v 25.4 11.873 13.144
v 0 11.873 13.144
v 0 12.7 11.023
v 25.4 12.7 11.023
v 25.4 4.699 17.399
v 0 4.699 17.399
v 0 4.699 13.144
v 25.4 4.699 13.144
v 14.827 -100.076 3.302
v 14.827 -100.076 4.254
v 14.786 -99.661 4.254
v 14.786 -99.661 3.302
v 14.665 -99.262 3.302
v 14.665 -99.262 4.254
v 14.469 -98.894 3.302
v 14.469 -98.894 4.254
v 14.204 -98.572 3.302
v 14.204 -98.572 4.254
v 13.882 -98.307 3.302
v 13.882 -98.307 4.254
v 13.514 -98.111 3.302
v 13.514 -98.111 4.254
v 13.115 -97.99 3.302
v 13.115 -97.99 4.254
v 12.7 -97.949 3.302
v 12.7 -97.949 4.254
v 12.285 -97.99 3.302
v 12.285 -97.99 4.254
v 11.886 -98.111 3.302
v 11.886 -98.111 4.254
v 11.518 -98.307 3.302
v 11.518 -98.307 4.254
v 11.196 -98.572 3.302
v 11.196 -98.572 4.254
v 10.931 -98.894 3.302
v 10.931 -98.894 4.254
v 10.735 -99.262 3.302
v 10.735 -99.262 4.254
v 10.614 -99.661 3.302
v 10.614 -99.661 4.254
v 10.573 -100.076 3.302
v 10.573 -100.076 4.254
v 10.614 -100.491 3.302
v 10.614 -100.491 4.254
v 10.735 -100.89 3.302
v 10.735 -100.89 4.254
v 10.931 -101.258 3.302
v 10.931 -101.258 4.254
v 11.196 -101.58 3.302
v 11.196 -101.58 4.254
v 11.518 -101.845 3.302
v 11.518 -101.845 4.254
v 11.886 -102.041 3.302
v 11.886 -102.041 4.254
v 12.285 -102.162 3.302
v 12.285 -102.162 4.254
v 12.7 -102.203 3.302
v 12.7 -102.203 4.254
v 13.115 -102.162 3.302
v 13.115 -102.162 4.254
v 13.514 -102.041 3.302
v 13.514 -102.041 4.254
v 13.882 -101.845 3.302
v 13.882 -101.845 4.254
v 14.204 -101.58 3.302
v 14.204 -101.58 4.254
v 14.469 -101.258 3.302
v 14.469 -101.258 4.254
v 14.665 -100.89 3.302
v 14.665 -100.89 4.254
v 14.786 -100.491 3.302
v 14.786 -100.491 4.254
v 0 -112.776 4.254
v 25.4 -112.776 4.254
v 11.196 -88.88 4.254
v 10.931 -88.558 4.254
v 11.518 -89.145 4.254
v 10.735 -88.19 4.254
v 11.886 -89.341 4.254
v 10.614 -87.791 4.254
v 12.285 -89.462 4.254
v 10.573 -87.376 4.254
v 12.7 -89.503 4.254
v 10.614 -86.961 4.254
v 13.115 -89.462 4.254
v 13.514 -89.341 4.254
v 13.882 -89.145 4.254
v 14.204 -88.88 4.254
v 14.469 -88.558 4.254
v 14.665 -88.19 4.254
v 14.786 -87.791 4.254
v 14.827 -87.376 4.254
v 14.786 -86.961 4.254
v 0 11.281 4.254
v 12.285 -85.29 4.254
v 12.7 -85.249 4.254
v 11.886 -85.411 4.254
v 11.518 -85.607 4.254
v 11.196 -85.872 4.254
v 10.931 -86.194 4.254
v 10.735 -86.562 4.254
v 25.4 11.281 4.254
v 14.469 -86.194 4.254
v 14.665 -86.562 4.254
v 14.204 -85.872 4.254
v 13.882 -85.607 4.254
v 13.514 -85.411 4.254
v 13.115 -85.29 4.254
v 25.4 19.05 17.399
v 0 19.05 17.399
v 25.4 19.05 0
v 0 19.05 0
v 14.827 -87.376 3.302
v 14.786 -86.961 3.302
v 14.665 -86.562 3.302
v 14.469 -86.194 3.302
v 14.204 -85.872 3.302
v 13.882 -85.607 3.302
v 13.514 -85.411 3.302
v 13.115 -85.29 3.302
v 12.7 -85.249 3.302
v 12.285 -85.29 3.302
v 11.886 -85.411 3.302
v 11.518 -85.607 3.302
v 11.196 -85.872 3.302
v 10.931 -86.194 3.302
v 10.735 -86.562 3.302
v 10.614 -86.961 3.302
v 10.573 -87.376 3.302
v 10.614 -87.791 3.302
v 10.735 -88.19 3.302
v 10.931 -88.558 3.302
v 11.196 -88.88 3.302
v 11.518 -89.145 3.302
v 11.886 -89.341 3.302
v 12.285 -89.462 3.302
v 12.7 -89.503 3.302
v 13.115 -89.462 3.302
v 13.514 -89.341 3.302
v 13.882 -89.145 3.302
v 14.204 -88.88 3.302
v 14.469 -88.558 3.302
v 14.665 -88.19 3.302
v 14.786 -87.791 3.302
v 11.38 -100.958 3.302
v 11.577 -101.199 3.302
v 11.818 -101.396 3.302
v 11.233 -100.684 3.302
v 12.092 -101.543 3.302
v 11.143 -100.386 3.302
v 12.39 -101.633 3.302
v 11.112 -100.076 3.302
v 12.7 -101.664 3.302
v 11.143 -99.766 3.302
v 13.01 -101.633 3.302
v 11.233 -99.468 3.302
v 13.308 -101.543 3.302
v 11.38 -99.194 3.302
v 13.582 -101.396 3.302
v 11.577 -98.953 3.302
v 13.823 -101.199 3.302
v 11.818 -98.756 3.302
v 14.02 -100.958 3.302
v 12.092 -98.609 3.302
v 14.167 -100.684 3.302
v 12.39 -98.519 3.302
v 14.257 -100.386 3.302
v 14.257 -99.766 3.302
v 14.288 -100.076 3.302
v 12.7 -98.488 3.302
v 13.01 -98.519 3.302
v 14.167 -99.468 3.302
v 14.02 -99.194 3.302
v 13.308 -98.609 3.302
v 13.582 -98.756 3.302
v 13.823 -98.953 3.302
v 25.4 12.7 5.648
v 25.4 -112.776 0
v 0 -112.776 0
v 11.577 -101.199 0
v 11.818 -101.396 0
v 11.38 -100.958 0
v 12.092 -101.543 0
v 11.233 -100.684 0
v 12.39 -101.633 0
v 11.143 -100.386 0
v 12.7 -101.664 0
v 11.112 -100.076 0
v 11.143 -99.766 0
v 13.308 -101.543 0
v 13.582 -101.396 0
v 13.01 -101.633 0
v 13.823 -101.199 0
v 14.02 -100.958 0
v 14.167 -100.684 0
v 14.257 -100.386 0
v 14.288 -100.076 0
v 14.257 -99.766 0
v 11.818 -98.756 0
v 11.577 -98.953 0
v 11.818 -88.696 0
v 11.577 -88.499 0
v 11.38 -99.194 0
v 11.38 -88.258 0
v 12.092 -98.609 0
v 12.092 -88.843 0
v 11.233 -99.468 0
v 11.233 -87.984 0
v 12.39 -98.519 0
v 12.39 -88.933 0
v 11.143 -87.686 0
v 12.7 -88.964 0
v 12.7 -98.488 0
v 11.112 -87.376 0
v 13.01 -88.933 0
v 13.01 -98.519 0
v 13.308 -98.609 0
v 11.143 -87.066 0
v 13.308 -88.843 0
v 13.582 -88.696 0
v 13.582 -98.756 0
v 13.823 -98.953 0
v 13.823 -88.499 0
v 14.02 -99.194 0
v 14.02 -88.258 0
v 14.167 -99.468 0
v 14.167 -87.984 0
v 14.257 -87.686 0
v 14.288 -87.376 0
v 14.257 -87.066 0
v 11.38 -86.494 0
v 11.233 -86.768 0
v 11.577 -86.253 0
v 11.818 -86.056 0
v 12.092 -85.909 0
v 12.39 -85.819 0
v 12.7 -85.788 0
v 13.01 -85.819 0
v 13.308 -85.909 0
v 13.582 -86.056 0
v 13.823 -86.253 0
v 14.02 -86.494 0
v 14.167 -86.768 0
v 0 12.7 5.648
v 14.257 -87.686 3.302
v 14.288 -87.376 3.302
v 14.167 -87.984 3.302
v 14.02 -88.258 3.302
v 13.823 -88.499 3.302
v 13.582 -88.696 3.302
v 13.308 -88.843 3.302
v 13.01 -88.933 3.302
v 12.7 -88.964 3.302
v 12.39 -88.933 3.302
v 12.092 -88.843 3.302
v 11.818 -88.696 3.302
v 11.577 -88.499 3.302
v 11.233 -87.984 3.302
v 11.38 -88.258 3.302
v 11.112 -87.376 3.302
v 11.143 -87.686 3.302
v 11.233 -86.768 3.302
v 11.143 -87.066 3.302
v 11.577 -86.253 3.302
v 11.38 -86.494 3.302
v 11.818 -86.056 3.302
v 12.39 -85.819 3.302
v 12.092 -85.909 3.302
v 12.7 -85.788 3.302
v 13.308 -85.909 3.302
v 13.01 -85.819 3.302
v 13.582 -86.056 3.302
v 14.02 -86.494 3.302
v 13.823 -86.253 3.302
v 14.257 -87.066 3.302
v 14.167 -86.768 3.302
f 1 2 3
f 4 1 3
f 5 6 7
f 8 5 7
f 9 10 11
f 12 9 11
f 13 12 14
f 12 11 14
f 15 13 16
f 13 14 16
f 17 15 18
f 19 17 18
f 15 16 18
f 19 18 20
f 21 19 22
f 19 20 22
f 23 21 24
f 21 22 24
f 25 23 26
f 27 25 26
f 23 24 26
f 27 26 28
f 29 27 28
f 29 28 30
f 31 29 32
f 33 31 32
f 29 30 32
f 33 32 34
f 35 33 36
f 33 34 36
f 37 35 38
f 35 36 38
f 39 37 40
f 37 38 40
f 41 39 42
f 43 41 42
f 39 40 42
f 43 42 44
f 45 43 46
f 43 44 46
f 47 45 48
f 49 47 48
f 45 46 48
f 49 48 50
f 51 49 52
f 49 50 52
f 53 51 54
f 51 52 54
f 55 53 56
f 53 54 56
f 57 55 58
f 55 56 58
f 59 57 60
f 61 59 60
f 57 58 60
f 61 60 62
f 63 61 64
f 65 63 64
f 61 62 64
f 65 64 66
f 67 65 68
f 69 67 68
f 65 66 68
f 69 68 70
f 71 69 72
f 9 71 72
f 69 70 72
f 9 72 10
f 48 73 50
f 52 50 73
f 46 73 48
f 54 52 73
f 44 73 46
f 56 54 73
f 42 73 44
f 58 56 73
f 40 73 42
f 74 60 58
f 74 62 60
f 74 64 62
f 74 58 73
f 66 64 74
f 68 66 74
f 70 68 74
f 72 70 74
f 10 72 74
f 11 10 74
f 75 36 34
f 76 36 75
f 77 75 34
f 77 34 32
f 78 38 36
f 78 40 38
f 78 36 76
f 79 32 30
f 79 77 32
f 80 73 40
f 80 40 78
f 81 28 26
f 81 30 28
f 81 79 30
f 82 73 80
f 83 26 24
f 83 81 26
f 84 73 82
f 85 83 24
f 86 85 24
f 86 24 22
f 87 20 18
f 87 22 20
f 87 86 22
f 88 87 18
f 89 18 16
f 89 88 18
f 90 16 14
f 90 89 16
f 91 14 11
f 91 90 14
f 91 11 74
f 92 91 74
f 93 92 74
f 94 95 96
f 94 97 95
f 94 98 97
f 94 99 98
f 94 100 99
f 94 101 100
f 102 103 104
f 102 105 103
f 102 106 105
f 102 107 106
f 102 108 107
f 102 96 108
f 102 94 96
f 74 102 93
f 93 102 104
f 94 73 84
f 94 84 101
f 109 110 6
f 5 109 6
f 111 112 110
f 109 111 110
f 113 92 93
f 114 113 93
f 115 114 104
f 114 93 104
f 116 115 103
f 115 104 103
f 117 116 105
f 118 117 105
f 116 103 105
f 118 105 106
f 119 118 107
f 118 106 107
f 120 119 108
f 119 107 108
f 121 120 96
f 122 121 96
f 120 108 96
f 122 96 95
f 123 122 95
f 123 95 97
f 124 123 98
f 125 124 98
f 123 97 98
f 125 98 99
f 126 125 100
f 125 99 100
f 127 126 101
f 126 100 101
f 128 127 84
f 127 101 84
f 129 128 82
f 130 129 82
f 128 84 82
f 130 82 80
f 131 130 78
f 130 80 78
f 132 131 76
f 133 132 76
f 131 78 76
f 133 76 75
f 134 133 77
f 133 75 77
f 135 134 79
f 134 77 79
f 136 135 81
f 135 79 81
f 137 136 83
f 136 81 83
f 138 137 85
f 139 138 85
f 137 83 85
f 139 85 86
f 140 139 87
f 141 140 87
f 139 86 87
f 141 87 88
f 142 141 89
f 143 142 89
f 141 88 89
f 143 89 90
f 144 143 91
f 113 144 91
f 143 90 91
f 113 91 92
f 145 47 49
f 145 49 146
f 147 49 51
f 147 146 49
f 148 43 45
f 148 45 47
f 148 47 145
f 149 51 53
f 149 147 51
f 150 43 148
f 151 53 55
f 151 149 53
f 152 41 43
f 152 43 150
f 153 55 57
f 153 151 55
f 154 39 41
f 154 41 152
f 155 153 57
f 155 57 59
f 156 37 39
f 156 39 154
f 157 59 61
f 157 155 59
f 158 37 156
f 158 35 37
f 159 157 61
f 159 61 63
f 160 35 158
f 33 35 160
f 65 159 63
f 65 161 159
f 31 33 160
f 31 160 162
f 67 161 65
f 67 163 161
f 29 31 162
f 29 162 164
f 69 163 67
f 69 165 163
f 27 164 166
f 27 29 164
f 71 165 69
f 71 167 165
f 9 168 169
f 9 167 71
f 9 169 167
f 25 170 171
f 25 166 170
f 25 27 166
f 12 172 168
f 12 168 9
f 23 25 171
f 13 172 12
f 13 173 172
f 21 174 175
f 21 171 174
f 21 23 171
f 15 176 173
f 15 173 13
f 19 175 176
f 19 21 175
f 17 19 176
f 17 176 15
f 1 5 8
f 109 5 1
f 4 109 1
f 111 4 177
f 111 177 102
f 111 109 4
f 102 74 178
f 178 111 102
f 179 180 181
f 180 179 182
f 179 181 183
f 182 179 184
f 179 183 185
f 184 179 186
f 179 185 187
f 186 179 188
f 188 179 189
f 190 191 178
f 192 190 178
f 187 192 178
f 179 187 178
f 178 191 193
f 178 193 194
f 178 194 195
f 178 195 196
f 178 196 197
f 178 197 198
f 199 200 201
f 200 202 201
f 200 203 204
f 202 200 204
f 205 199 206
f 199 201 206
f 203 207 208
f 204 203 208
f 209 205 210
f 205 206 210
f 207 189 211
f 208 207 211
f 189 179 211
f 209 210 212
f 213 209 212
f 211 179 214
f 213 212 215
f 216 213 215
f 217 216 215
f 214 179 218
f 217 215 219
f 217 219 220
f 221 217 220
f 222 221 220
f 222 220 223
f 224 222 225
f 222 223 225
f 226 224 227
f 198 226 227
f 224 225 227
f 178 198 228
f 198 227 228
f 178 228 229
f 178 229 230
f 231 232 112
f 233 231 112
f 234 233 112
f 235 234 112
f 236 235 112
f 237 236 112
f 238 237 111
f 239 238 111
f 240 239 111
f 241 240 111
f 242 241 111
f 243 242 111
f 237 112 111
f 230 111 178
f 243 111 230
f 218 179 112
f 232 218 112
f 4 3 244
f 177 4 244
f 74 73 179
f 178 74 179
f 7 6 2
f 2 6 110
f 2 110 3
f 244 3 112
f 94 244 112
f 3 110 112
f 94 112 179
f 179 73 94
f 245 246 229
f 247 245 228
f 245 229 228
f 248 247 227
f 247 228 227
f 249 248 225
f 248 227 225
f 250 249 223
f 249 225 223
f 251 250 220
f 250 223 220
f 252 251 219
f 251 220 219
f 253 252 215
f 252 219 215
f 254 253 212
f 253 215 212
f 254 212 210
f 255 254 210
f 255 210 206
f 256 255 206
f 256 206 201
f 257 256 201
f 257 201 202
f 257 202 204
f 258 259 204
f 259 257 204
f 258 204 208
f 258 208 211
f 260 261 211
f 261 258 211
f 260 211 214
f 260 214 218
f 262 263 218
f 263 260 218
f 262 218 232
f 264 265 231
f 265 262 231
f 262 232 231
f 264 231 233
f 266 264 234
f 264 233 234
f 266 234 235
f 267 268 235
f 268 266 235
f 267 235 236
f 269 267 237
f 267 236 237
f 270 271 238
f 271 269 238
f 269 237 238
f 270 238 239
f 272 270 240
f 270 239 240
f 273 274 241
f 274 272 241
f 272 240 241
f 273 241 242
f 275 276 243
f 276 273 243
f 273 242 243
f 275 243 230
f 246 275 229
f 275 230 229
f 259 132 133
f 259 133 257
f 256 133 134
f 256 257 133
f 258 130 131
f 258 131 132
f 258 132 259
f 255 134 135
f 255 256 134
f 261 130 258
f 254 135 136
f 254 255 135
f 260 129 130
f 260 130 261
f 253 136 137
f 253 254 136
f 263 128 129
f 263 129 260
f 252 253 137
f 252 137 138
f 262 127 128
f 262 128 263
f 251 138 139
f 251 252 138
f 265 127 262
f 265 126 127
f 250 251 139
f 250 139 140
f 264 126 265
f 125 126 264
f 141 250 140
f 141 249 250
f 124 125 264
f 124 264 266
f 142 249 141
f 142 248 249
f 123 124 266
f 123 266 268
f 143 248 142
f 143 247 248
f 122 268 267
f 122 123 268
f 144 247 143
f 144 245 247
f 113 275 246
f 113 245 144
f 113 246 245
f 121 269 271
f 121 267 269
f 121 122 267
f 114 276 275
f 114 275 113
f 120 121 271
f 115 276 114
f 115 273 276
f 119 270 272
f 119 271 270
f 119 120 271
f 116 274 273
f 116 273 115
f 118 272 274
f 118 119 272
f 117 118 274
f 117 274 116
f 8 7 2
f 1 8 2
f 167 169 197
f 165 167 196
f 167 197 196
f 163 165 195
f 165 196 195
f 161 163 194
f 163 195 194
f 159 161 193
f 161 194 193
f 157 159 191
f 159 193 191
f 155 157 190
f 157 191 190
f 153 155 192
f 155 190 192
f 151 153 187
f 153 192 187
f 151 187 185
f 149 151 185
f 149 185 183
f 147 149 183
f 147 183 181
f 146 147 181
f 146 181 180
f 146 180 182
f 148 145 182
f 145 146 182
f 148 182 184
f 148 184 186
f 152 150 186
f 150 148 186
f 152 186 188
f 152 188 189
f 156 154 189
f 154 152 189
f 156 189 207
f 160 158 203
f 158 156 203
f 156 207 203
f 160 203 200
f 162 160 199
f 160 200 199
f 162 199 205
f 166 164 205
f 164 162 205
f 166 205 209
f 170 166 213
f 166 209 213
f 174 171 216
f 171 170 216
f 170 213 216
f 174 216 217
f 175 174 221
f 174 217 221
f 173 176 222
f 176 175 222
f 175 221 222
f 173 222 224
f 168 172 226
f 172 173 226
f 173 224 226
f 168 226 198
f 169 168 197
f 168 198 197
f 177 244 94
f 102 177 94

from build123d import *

# Parameters (mm, degrees)
F1_DEPTH = 25.4
F2_DEPTH = 112.776
F3_R     = 1.5875
F4_DEPTH = 25.4
F5_R     = 2.12725
F5_R_2   = 1.5875
F6_DEPTH = 0.9525


with BuildPart() as f1:
    # F0 (on Right) → F1 (new body)
    with BuildSketch(Plane.YZ):
        Polygon((0, 4.2545), (0, 0), (12.7, 0), (19.05, 0), (19.05, 4.2545), (19.05, 17.399), (12.7, 17.399), (4.699, 17.399), (4.699, 13.1445), (11.8730319638, 13.1445), (12.7, 11.0233025625), (12.7, 5.6484807283), (11.281458661, 4.2545), align=None)
    extrude(amount=F1_DEPTH)

    # F2 (add): a face of the model
    f2_faces = [f1.faces().sort_by_distance(p)[0] for p in [
        (12.7, 0, 2.12725),
    ]]
    extrude(f2_faces, amount=F2_DEPTH)

    # F3 (on face) → F4 (cut)
    with BuildSketch(Plane(origin=(0, 0, 0), x_dir=(1, 0, 0), z_dir=(0, 0, -1))):
        with Locations((12.7, 100.076)):
            Circle(F3_R)
        with Locations((12.7, 87.376)):
            Circle(F3_R)
    extrude(amount=-F4_DEPTH, mode=Mode.SUBTRACT)

    # F5 (on face) → F6 (cut)
    with BuildSketch(Plane.XY.offset(4.2545)):
        with Locations((12.7, -87.376)):
            Circle(F5_R)
        with Locations((12.7, -87.376)):
            Circle(F5_R_2, mode=Mode.SUBTRACT)
        with Locations((12.7, -100.076)):
            Circle(F5_R)
        with Locations((12.7, -100.076)):
            Circle(F5_R_2, mode=Mode.SUBTRACT)
    extrude(amount=-F6_DEPTH, mode=Mode.SUBTRACT)


solid = f1.part
